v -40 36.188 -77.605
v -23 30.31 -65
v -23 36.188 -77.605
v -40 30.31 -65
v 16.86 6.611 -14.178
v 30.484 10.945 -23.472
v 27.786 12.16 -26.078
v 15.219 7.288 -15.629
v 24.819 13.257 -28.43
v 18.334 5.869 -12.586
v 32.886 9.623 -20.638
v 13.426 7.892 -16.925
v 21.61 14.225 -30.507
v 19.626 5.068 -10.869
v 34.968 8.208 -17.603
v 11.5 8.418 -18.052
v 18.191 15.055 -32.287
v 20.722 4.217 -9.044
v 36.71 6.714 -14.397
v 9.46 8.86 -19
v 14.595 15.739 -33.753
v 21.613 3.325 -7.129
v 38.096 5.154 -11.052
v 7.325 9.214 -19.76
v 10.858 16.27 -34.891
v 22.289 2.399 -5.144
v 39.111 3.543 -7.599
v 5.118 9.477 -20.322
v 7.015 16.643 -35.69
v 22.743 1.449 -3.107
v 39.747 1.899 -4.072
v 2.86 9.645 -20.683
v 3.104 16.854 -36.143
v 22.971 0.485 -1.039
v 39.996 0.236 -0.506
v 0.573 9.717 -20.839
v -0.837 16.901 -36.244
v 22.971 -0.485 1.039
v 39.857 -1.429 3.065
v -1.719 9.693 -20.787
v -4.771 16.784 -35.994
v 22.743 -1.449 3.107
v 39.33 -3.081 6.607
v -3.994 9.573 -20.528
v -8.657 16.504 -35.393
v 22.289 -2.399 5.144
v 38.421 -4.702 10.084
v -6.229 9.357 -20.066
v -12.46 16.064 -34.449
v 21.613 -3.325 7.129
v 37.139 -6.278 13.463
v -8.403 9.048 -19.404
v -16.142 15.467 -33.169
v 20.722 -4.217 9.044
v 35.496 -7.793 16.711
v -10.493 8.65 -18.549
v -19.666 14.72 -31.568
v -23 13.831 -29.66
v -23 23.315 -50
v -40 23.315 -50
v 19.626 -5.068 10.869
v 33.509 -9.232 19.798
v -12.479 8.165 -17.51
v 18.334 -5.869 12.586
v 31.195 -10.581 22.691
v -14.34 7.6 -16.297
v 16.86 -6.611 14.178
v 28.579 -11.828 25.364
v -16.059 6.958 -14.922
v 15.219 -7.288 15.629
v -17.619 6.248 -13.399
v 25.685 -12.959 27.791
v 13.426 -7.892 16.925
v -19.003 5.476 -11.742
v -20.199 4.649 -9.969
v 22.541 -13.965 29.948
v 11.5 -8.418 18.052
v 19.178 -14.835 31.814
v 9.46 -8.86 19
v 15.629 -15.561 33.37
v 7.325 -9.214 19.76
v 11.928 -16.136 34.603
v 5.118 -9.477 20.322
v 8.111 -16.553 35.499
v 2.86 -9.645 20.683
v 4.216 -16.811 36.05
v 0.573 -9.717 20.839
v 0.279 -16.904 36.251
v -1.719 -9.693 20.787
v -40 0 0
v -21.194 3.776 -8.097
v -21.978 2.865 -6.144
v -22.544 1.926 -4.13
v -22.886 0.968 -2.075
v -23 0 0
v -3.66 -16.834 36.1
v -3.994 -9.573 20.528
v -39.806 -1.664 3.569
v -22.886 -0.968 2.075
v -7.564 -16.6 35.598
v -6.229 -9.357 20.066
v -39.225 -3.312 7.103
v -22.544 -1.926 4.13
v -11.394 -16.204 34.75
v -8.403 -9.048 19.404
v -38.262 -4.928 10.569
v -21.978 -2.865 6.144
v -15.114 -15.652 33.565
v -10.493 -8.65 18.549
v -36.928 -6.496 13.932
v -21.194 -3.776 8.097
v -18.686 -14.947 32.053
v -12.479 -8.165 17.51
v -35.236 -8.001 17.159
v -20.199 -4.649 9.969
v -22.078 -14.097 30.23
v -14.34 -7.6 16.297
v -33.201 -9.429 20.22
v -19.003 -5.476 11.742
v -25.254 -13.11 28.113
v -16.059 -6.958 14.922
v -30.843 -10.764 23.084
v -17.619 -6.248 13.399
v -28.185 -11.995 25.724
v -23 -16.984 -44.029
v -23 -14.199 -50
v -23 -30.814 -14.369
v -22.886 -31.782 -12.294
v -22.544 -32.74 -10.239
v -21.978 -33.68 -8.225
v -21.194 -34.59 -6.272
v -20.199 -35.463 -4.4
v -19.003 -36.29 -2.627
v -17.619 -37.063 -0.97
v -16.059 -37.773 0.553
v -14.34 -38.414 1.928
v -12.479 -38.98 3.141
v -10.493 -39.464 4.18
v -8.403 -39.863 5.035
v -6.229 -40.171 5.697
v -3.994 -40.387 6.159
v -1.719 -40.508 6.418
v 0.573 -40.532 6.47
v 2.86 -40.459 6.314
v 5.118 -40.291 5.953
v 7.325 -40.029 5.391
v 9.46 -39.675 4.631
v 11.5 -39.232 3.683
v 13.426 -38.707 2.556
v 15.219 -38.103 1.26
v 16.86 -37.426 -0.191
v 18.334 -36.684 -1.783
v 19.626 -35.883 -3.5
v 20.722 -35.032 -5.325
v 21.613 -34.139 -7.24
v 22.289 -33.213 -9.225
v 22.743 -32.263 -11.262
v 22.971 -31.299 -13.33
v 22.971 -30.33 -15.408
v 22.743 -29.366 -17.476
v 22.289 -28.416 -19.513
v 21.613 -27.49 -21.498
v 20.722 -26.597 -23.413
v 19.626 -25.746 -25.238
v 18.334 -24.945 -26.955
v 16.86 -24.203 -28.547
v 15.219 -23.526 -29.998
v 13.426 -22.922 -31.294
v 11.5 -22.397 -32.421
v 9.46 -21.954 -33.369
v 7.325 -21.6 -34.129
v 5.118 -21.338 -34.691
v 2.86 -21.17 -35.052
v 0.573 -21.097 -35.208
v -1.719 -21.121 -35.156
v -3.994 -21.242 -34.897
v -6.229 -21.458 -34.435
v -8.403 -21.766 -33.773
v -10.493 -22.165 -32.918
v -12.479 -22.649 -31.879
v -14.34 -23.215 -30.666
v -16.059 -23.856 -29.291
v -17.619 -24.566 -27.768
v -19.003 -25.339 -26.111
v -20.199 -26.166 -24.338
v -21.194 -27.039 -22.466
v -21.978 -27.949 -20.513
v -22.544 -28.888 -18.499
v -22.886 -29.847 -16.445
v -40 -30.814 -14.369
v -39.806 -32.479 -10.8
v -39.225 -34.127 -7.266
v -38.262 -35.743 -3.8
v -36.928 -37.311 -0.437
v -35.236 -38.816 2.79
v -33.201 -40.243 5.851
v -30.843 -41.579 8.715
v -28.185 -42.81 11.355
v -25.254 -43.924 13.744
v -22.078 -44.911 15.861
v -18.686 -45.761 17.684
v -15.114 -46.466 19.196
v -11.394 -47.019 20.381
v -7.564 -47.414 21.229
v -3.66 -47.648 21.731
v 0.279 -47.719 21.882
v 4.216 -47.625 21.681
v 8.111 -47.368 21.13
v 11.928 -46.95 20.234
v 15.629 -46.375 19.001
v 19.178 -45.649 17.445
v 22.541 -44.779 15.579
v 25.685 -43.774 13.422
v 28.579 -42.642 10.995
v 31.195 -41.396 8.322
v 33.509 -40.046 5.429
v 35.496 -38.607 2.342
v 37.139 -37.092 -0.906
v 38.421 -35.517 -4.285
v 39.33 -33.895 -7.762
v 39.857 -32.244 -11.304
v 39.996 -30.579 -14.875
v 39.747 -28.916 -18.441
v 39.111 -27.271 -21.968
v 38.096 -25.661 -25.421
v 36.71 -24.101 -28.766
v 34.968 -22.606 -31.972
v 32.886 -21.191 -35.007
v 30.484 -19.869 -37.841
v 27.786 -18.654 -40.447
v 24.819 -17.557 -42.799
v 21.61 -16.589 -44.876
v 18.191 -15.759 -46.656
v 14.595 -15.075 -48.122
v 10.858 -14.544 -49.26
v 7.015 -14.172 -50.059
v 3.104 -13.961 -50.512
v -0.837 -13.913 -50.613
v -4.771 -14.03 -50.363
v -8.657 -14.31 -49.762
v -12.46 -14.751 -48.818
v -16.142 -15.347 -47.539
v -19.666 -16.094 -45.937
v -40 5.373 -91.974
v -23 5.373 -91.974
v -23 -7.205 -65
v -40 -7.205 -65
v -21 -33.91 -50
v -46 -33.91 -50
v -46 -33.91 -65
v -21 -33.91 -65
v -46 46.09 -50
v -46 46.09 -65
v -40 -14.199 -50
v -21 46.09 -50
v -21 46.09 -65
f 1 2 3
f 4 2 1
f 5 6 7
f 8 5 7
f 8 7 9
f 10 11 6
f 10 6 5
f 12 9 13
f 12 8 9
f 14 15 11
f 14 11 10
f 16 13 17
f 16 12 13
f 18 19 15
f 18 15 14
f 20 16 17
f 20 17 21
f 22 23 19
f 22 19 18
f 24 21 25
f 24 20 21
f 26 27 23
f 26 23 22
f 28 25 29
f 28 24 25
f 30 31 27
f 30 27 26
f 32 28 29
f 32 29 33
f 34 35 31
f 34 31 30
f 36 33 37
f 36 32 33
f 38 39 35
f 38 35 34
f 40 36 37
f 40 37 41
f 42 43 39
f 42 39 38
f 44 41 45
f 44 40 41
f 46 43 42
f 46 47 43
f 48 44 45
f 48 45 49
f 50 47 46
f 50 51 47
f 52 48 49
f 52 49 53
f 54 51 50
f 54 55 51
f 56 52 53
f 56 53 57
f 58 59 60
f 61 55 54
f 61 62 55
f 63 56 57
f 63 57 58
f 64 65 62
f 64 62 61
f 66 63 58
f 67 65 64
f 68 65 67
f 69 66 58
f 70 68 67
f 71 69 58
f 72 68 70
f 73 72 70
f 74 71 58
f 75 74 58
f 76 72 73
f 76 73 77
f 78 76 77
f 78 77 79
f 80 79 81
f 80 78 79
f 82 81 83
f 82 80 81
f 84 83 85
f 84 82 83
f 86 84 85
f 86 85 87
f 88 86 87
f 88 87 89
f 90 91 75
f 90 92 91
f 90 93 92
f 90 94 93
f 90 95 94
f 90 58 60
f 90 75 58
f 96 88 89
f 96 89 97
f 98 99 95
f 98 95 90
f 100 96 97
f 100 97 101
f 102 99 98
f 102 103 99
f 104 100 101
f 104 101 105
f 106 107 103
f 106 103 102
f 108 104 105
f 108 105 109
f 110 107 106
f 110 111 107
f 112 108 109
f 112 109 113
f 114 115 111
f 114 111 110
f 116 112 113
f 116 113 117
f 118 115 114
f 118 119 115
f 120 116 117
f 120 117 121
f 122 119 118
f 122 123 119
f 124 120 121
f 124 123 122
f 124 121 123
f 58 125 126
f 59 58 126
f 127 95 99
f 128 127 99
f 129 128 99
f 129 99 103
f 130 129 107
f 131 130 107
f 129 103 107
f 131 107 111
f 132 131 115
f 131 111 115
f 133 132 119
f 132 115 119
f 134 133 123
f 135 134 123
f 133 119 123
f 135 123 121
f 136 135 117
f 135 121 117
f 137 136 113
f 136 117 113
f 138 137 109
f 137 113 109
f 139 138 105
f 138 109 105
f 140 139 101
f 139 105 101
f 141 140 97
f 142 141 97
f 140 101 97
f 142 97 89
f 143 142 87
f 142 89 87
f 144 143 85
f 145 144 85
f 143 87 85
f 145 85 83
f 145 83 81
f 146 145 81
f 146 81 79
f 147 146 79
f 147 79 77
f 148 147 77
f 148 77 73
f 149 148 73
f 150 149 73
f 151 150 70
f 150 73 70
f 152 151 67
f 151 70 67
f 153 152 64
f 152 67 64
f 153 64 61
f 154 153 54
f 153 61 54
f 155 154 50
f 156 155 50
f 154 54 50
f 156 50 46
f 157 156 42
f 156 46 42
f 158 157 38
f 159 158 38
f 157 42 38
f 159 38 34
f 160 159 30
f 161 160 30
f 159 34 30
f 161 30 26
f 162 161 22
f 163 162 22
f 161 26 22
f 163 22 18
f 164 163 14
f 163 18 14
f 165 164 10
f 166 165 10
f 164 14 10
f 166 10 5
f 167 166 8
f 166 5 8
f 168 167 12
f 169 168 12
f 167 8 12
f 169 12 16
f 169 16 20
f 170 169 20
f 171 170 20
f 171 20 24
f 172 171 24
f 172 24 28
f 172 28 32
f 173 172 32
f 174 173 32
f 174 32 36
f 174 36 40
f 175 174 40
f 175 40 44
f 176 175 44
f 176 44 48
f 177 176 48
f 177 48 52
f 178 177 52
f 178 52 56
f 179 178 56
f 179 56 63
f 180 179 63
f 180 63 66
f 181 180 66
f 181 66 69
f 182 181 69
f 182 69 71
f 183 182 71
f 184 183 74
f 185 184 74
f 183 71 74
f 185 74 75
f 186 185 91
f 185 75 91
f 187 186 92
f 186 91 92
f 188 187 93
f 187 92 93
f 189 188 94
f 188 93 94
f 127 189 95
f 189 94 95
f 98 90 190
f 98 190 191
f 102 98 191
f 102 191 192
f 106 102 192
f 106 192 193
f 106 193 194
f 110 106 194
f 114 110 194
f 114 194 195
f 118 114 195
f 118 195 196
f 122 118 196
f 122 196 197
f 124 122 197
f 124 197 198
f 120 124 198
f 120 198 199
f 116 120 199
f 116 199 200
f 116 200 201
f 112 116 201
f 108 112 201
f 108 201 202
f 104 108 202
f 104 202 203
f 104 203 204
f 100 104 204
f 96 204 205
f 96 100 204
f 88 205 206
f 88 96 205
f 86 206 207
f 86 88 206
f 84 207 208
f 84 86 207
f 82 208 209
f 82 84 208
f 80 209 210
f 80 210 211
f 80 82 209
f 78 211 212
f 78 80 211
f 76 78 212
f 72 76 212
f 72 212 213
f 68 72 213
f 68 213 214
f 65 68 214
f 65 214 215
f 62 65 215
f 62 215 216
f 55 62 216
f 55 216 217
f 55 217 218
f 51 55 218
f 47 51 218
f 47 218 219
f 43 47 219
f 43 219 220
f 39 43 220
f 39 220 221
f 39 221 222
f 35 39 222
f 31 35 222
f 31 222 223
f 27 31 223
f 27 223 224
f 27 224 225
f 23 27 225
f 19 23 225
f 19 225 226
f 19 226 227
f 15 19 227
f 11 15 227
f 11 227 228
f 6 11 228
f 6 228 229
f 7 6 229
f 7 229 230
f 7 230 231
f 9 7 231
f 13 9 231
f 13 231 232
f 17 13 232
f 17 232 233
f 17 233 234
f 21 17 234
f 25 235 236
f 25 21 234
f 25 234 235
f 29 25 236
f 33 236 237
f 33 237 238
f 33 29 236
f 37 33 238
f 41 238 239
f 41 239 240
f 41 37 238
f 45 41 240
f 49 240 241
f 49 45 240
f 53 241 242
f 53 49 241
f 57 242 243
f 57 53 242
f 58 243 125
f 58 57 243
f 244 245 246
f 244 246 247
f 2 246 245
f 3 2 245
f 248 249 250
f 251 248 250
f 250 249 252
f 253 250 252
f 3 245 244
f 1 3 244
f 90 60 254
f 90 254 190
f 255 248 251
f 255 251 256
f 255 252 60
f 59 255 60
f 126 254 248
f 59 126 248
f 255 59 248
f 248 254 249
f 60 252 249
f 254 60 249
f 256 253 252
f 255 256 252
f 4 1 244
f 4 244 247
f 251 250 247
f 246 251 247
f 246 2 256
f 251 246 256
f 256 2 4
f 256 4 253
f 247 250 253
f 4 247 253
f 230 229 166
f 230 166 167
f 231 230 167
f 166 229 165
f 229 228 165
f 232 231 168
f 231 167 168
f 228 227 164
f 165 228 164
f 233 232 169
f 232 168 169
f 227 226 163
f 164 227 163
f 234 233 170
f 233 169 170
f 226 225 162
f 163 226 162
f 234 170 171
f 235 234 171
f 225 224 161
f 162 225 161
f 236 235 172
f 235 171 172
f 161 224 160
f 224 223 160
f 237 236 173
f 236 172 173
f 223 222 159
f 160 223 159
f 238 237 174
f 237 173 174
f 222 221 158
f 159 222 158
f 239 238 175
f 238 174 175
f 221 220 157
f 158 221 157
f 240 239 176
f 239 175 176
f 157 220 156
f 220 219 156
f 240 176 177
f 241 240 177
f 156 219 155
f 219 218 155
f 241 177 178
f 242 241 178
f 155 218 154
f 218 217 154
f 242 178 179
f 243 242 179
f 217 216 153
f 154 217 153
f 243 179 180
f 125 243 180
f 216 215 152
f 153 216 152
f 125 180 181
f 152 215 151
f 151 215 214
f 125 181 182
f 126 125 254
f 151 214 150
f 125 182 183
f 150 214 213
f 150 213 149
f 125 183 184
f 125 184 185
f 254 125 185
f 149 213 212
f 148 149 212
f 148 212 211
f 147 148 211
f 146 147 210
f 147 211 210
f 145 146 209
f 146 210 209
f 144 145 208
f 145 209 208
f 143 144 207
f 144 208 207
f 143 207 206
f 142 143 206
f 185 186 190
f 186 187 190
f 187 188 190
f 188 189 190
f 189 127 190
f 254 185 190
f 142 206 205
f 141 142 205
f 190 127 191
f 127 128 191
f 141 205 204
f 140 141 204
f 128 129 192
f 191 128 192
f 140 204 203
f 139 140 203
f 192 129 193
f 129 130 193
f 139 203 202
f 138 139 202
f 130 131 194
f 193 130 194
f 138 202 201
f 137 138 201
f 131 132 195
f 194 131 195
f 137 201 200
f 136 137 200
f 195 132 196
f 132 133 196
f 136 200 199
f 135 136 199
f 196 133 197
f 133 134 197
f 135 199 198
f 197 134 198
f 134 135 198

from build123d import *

# Parameters (mm, degrees)
F2_R      = 40
F2_R_2    = 23
F4_DEPTH  = 34
F8_DEPTH  = 25
F10_DEPTH = 34


with BuildPart() as f4:
    # F2 (on face) → F4 (new body)
    with BuildSketch(Plane(origin=(0, 0, 0), x_dir=(-1, 0, 0), z_dir=(0, 0.906308, 0.422618))):
        Circle(F2_R)
        Circle(F2_R_2, mode=Mode.SUBTRACT)
    extrude(amount=-F4_DEPTH)



with BuildPart() as f8:
    # F7 (on offset) → F8 (new body)
    with BuildSketch(Plane.YZ.offset(-46)):
        Polygon((-14.199466, -50), (-33.909734, -50), (-33.909734, -65), (-13.909734, -65), (-13.909734, -50.621332), align=None)
        Polygon((-13.909734, -50.621332), (-13.909734, -65), (-7.204851, -65), align=None)
        Polygon((23.315383, -50), (-14.199466, -50), (-13.909734, -50.621332), (-7.204851, -65), (30.309998, -65), align=None)
        Polygon((46.090266, -50), (23.315383, -50), (30.309998, -65), (46.090266, -65), align=None)
    extrude(amount=F8_DEPTH)


with BuildPart() as f4_1:
    add(f4.part)

    add(f8.part)  # F10 merges F8
    # F9 (on face) → F10 (join, through all)
    with BuildSketch(Plane(origin=(0, 0, 0), x_dir=(-1, 0, 0), z_dir=(0, 0.906308, 0.422618))):
        with BuildLine():
            Line((40, -85.627586), (40, 0))
            ThreePointArc((40, 0), (35.496479, -18.439089), (23, -32.726136))
            Line((23, -32.726136), (23, -85.627586))
            Line((23, -85.627586), (40, -85.627586))
        make_face()
    extrude(amount=-F10_DEPTH)


solid = f4_1.part
